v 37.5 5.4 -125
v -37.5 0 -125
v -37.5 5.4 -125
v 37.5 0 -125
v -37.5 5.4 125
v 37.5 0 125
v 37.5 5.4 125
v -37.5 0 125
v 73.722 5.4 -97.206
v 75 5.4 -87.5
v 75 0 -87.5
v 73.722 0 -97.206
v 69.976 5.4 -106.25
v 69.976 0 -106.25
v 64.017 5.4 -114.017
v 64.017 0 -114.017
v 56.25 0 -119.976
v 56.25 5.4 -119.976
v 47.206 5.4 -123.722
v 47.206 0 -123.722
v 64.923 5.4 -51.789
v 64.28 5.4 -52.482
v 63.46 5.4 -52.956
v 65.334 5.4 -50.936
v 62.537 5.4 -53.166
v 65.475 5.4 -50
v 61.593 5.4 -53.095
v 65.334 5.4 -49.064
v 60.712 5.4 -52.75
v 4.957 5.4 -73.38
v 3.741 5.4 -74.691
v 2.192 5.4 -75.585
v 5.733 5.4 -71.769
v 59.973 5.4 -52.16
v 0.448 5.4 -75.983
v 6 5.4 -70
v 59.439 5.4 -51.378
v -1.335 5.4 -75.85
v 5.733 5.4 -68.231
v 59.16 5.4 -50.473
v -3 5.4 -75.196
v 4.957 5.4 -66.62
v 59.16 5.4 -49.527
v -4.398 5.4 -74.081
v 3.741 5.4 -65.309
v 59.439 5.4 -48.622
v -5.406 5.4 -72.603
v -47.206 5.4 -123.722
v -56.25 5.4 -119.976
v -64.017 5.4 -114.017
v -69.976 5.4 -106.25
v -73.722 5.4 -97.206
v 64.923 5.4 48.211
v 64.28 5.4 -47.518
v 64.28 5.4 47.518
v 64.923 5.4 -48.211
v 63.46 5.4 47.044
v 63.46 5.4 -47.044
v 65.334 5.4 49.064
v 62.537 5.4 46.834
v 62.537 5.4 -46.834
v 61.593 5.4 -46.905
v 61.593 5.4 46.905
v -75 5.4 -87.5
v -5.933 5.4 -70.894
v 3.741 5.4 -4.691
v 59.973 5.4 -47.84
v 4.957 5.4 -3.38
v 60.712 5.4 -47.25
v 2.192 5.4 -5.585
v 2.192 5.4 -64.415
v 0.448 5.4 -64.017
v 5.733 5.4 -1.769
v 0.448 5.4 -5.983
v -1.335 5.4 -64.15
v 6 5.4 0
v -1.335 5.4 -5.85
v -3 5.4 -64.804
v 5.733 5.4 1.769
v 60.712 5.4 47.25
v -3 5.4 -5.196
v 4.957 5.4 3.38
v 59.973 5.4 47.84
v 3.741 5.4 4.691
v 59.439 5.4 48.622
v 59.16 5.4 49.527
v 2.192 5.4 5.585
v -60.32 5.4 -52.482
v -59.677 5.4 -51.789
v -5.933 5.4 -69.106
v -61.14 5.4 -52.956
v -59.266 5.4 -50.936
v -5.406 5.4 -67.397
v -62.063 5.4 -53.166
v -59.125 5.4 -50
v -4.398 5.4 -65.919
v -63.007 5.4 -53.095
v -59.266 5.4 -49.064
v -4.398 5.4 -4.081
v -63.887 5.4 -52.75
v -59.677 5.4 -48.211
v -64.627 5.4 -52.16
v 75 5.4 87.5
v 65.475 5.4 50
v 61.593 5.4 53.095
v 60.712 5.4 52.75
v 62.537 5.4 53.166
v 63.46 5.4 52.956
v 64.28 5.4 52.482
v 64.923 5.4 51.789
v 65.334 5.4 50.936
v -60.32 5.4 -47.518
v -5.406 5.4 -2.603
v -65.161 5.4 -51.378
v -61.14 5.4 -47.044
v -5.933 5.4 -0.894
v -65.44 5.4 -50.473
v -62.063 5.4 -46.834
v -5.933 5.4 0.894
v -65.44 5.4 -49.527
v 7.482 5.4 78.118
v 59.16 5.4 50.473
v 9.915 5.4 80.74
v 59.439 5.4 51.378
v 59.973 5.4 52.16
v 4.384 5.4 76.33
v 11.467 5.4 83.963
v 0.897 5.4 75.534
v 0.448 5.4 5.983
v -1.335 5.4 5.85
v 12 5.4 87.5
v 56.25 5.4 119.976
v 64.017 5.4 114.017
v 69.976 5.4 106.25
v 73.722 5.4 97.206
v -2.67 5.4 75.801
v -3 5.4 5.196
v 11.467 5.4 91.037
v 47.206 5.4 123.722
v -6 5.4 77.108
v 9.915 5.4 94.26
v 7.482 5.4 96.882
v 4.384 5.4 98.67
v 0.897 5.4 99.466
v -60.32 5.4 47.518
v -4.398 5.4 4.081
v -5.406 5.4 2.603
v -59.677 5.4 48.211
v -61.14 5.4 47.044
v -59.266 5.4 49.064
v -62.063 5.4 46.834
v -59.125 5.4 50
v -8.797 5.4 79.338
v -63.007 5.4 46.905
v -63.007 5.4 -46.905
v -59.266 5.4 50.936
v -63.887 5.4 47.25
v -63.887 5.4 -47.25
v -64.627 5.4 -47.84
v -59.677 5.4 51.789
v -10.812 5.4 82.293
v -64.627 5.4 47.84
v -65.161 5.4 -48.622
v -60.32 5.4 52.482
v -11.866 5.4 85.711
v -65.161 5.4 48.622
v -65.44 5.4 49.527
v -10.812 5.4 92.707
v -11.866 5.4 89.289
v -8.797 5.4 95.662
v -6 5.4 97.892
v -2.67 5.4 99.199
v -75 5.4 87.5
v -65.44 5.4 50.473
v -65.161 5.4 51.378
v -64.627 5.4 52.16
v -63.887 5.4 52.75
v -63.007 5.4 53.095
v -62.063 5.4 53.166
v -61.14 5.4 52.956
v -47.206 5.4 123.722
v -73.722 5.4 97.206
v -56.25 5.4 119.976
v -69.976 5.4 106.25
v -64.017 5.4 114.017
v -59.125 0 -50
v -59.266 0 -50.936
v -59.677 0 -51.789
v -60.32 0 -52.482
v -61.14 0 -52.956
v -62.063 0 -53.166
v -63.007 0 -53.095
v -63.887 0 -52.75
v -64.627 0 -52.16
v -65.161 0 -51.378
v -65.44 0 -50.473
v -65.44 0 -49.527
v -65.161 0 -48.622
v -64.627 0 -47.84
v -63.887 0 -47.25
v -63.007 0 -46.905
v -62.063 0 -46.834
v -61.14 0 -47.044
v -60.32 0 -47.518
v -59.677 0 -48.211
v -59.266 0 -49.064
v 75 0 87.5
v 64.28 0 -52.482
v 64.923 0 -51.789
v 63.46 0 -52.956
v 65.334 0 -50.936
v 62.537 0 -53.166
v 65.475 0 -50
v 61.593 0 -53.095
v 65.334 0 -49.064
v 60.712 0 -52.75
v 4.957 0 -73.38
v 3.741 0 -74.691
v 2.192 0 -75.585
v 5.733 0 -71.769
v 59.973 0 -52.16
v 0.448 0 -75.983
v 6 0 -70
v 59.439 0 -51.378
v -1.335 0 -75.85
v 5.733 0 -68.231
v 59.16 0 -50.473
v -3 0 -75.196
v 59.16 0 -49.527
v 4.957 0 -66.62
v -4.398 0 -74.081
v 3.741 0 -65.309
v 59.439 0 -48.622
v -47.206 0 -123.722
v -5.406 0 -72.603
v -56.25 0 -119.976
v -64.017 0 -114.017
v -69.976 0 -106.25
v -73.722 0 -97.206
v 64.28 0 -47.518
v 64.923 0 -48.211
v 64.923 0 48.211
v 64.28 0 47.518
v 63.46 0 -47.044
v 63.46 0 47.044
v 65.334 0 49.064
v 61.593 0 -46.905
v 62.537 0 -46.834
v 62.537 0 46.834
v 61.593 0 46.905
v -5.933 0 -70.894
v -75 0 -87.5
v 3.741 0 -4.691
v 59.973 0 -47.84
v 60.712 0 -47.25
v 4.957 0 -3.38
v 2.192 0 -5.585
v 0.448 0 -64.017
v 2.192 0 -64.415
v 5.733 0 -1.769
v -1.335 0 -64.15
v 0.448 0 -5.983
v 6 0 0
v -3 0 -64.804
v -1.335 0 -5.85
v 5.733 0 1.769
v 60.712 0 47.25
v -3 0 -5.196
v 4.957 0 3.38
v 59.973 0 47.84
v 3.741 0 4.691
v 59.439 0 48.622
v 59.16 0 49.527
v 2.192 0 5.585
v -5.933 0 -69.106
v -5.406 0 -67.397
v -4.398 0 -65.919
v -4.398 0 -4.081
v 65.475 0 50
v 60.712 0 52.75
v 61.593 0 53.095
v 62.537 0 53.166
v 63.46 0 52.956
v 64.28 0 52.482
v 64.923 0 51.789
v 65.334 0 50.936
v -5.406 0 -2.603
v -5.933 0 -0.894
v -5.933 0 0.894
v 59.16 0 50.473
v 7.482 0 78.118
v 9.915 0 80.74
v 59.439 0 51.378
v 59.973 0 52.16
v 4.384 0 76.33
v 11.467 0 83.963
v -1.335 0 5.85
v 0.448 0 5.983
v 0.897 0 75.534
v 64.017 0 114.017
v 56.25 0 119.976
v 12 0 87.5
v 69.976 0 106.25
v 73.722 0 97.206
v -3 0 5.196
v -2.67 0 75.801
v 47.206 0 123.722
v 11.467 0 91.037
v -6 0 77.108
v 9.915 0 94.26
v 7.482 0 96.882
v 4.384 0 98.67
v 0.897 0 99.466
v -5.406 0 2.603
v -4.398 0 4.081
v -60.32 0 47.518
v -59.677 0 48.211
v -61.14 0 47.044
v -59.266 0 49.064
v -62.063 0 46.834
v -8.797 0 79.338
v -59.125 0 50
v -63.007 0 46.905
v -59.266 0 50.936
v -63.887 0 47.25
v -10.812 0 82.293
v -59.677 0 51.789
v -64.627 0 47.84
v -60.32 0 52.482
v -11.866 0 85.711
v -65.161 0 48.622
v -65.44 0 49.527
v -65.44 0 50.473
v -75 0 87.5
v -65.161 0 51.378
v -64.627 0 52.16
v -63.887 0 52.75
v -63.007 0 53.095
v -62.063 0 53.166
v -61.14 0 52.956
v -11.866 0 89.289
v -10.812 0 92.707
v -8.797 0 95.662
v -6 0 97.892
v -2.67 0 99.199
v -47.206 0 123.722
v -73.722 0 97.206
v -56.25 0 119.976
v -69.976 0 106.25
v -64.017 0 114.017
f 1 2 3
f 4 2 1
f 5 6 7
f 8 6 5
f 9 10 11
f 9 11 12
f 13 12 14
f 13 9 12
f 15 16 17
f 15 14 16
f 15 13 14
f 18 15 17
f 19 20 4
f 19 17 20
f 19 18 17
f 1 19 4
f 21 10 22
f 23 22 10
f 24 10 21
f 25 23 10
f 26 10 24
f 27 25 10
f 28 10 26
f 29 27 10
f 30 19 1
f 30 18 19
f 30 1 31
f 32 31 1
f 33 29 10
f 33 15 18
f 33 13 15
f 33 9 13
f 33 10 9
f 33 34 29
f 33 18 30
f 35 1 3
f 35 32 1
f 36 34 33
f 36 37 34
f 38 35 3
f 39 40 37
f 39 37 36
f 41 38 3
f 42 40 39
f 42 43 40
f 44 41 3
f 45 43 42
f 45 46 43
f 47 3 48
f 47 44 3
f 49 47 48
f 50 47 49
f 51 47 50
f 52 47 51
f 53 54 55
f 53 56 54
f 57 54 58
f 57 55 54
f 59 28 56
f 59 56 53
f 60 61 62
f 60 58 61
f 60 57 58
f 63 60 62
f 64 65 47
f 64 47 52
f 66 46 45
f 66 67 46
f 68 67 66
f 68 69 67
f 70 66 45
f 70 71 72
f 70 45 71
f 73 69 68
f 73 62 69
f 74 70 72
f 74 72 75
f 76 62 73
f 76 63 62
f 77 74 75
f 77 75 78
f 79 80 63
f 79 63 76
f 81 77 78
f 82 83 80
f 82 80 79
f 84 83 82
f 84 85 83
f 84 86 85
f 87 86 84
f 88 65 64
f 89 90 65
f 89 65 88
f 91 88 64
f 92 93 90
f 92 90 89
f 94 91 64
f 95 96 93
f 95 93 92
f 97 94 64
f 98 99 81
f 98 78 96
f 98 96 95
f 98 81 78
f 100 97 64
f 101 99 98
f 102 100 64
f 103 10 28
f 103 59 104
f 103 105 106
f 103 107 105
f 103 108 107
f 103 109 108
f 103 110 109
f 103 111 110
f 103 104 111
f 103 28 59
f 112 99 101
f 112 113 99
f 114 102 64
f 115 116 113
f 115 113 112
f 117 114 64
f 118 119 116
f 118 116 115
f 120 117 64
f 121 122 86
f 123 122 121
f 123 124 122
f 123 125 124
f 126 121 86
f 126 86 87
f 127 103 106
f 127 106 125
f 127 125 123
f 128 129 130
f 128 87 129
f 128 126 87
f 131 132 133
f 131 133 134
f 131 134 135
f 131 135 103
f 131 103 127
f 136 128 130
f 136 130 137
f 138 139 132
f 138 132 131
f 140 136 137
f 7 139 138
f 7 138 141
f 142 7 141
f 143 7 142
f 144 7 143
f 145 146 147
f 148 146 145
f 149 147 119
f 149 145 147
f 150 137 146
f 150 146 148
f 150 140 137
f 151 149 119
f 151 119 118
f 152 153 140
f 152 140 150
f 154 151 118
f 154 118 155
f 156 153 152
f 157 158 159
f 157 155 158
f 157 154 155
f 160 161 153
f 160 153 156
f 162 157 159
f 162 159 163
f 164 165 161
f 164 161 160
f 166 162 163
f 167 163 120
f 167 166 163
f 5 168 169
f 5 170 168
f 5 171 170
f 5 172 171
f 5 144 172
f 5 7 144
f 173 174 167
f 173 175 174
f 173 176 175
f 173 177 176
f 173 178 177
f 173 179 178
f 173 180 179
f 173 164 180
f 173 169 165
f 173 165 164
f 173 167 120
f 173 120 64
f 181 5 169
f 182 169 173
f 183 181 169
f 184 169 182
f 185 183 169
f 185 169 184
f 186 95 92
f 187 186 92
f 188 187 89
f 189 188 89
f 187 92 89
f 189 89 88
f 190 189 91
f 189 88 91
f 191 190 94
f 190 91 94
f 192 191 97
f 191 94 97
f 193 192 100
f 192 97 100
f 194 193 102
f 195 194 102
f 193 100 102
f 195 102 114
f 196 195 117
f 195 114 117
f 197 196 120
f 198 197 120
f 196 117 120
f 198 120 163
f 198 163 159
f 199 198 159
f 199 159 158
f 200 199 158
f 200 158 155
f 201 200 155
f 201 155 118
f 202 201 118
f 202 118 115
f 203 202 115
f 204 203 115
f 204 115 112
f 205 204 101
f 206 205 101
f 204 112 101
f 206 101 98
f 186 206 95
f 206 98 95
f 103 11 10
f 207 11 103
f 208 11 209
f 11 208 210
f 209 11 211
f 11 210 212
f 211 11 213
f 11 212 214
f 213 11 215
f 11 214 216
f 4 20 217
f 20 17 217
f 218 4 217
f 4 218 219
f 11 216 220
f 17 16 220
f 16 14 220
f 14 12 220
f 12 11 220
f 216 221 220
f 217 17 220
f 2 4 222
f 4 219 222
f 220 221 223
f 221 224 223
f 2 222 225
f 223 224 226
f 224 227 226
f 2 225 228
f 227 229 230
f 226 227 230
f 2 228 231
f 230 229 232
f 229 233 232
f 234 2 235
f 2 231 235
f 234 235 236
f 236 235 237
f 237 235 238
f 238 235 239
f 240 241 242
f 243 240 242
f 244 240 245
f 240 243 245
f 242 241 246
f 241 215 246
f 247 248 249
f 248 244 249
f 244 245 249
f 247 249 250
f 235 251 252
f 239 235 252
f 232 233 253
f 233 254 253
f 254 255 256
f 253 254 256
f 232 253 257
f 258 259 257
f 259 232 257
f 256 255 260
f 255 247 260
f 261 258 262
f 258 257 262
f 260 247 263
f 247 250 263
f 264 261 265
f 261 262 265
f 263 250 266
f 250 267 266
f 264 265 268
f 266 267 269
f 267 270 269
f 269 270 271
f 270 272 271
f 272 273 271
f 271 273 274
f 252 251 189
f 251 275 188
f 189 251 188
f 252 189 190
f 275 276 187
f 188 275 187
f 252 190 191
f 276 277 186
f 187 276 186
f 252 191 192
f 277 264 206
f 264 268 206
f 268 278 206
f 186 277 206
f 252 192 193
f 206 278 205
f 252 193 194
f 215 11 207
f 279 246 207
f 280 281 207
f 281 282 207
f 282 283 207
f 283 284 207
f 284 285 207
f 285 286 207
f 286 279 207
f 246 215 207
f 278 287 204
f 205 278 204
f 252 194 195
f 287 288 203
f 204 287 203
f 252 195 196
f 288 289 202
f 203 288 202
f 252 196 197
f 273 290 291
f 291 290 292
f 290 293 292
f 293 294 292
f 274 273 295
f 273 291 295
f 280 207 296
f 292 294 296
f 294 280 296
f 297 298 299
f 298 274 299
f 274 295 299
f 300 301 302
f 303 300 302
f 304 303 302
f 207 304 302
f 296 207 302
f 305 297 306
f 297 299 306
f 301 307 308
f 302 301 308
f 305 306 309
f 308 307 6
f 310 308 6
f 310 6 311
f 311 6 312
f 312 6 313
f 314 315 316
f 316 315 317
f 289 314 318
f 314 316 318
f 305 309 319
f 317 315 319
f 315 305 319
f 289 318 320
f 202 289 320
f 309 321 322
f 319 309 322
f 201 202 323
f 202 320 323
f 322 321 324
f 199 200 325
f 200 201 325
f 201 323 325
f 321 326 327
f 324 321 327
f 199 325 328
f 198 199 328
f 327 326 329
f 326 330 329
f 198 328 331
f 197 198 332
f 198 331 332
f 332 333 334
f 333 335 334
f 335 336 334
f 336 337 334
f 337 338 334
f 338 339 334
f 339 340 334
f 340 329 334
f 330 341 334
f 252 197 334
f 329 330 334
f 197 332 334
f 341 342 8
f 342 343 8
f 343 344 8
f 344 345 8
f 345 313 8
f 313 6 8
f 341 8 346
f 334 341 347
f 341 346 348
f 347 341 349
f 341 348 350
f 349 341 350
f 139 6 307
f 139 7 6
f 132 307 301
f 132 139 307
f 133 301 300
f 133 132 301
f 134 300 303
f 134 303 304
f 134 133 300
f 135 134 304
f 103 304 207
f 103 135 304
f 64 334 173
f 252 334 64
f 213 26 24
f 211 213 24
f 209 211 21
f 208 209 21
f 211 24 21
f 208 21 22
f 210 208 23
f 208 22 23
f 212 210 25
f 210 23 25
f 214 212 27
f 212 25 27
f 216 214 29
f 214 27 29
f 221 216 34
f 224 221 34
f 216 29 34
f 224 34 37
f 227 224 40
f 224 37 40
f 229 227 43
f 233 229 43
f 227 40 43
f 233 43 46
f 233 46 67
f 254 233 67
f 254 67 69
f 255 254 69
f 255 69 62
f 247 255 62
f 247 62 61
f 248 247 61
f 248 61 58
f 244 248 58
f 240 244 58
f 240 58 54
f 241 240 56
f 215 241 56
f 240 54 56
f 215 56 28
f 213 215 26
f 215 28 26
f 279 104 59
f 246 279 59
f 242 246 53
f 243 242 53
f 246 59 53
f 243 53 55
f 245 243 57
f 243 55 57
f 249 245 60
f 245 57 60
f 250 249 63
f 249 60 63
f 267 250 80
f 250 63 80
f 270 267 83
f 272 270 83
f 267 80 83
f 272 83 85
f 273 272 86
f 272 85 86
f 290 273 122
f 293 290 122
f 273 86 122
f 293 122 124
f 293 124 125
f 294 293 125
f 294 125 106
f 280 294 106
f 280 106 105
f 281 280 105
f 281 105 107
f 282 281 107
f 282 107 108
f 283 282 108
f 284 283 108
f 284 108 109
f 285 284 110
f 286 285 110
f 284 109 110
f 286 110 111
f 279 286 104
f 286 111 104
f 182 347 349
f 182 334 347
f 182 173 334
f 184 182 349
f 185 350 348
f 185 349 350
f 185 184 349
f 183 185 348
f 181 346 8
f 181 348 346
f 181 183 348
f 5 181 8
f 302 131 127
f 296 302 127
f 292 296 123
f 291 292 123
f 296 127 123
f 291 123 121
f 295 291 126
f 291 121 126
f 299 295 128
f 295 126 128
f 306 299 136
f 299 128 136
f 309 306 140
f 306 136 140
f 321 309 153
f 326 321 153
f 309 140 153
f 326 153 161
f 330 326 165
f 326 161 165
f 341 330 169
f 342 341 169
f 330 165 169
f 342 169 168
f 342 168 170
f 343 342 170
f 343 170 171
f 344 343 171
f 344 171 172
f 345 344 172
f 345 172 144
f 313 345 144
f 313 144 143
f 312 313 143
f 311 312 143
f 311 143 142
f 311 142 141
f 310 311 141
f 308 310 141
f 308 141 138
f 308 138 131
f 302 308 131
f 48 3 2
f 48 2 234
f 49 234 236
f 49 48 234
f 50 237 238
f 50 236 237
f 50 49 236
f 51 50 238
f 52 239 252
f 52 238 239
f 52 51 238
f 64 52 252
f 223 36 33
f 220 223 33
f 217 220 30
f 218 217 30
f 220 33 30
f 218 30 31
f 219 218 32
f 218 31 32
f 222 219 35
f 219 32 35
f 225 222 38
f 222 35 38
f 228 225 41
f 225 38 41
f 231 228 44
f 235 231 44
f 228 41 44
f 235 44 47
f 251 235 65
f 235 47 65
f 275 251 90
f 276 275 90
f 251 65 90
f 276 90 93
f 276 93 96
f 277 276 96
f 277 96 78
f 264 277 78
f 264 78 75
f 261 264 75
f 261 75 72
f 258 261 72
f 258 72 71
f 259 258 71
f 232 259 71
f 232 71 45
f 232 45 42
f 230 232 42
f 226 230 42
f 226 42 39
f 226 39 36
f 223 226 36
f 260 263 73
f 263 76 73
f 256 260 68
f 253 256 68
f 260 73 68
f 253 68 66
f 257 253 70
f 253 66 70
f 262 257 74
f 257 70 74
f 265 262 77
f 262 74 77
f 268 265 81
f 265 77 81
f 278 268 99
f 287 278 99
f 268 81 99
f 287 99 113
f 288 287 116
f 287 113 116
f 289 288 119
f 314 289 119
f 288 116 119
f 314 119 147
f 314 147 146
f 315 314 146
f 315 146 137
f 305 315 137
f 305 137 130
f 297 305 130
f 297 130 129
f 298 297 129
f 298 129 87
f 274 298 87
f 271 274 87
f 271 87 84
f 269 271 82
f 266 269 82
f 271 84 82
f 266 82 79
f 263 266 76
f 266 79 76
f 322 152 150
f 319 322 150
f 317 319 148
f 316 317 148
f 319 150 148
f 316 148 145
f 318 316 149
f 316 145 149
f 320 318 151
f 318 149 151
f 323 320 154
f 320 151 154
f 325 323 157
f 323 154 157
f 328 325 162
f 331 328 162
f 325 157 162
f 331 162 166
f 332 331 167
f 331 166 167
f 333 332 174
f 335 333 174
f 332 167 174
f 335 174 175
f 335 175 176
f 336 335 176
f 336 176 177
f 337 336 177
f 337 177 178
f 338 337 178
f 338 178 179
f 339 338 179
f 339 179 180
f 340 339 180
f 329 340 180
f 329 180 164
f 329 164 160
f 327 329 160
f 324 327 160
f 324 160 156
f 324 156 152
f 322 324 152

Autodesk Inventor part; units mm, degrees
ref_plane "YZ Plane" through (0, 0, 0) normal (1, 0, 0) x (0, 1, 0)
ref_plane "XZ Plane" through (0, 0, 0) normal (0, 1, 0) x (-1, 0, 0)
ref_plane "XY Plane" through (0, 0, 0) normal (0, 0, 1) x (1, 0, 0)
sketch "Sketch1" plane through (0, 0, 0) normal (0, 1, 0) x (-1, 0, 0)
  line L0 (-75, 125) -> (75, 125)
  line L1 (75, 125) -> (75, -125)
  line L2 (75, -125) -> (-75, -125)
  line L3 (-75, -125) -> (-75, 125)
  line L4 (-75, 125) -> (75, -125) construction
  line L5 (75, 125) -> (-75, -125) construction
  point P0 (0, 0)
  dimension "d0" = 150
  dimension "d1" = 250
extrude "Extrusion1" add sketch "Sketch1" along normal blind 5.4
fillet "Fillet1" radius 37.5 4 edges at (75, 2.7, 125) (75, 2.7, -125) (-75, 2.7, 125) (-75, 2.7, -125)
sketch "Sketch2" plane through (0, 5.4, 0) normal (0, 1, 0) x (1, 0, 0)
  line L0 (37.5, -125) -> (-37.5, -125)
  line L1 (-37.5, -125) -> (-37.5, -50)
  line L2 (-37.5, -50) -> (37.5, -50)
  line L3 (37.5, -50) -> (37.5, -125)
  line L4 (-37.5, -125) -> (37.5, -125) projected
  line L5 (-75, 87.5) -> (-75, -87.5) projected
  circle A0 centre (0, -87.5) radius 12
  point P0 (0, 0)
  point P1 (-37.5, -87.5)
  point P2 (0, -50)
  dimension "d6" = 75
  dimension "d7" = 0
  dimension "d9" = 24
  dimension "d10" = 37.5
  dimension "d11" = 37.5
extrude "Extrusion2" cut sketch "Sketch2" against normal blind 20.5 contours A0
sketch "Sketch3" plane through (0, 5.4, 0) normal (0, 1, 0) x (1, 0, 0)
  circle A0 centre (0, 0) radius 6
  circle A1 centre (0, 70) radius 6
  line L0 (37.5, 125) -> (-37.5, 125) projected
  line L1 (-75, 87.5) -> (-75, -87.5) projected
  line L2 (-37.5, -125) -> (37.5, -125) projected
  line L3 (75, -87.5) -> (75, 87.5) projected
  point P0 (0, 125)
  point P1 (0, 125)
  point P2 (0, -125)
  dimension "d15" = 12
  dimension "d16" = 55
  dimension "d21" = 75
  dimension "d22" = 125
  dimension "d23" = 250
  dimension "d24" = 150
extrude "Extrusion3" cut sketch "Sketch3" against normal blind 40
sketch "Sketch4" plane through (0, 5.4, 0) normal (0, 1, 0) x (1, 0, 0)
  circle A0 centre (-62.3, 50) radius 3.175
  line L0 (37.5, 125) -> (-37.5, 125) projected
  line L1 (-75, 87.5) -> (-75, -87.5) projected
  circle A1 centre (-62.3, -50) radius 3.175
  circle A2 centre (62.3, 50) radius 3.175
  circle A3 centre (62.3, -50) radius 3.175
  point P0 (0, 0)
  dimension "d27" = 100
  dimension "d30" = 124.6
  dimension "d33" = 12.7
  dimension "d34" = 6.35
  dimension "d35" = 50
extrude "Extrusion4" cut sketch "Sketch4" against normal blind 40
equation "\"d21\" = 0.5 * d24"
equation "\"d22\" = 0.5 * d23"
equation "\"d27\" = 2 * d35"
properties part number "Plate"
